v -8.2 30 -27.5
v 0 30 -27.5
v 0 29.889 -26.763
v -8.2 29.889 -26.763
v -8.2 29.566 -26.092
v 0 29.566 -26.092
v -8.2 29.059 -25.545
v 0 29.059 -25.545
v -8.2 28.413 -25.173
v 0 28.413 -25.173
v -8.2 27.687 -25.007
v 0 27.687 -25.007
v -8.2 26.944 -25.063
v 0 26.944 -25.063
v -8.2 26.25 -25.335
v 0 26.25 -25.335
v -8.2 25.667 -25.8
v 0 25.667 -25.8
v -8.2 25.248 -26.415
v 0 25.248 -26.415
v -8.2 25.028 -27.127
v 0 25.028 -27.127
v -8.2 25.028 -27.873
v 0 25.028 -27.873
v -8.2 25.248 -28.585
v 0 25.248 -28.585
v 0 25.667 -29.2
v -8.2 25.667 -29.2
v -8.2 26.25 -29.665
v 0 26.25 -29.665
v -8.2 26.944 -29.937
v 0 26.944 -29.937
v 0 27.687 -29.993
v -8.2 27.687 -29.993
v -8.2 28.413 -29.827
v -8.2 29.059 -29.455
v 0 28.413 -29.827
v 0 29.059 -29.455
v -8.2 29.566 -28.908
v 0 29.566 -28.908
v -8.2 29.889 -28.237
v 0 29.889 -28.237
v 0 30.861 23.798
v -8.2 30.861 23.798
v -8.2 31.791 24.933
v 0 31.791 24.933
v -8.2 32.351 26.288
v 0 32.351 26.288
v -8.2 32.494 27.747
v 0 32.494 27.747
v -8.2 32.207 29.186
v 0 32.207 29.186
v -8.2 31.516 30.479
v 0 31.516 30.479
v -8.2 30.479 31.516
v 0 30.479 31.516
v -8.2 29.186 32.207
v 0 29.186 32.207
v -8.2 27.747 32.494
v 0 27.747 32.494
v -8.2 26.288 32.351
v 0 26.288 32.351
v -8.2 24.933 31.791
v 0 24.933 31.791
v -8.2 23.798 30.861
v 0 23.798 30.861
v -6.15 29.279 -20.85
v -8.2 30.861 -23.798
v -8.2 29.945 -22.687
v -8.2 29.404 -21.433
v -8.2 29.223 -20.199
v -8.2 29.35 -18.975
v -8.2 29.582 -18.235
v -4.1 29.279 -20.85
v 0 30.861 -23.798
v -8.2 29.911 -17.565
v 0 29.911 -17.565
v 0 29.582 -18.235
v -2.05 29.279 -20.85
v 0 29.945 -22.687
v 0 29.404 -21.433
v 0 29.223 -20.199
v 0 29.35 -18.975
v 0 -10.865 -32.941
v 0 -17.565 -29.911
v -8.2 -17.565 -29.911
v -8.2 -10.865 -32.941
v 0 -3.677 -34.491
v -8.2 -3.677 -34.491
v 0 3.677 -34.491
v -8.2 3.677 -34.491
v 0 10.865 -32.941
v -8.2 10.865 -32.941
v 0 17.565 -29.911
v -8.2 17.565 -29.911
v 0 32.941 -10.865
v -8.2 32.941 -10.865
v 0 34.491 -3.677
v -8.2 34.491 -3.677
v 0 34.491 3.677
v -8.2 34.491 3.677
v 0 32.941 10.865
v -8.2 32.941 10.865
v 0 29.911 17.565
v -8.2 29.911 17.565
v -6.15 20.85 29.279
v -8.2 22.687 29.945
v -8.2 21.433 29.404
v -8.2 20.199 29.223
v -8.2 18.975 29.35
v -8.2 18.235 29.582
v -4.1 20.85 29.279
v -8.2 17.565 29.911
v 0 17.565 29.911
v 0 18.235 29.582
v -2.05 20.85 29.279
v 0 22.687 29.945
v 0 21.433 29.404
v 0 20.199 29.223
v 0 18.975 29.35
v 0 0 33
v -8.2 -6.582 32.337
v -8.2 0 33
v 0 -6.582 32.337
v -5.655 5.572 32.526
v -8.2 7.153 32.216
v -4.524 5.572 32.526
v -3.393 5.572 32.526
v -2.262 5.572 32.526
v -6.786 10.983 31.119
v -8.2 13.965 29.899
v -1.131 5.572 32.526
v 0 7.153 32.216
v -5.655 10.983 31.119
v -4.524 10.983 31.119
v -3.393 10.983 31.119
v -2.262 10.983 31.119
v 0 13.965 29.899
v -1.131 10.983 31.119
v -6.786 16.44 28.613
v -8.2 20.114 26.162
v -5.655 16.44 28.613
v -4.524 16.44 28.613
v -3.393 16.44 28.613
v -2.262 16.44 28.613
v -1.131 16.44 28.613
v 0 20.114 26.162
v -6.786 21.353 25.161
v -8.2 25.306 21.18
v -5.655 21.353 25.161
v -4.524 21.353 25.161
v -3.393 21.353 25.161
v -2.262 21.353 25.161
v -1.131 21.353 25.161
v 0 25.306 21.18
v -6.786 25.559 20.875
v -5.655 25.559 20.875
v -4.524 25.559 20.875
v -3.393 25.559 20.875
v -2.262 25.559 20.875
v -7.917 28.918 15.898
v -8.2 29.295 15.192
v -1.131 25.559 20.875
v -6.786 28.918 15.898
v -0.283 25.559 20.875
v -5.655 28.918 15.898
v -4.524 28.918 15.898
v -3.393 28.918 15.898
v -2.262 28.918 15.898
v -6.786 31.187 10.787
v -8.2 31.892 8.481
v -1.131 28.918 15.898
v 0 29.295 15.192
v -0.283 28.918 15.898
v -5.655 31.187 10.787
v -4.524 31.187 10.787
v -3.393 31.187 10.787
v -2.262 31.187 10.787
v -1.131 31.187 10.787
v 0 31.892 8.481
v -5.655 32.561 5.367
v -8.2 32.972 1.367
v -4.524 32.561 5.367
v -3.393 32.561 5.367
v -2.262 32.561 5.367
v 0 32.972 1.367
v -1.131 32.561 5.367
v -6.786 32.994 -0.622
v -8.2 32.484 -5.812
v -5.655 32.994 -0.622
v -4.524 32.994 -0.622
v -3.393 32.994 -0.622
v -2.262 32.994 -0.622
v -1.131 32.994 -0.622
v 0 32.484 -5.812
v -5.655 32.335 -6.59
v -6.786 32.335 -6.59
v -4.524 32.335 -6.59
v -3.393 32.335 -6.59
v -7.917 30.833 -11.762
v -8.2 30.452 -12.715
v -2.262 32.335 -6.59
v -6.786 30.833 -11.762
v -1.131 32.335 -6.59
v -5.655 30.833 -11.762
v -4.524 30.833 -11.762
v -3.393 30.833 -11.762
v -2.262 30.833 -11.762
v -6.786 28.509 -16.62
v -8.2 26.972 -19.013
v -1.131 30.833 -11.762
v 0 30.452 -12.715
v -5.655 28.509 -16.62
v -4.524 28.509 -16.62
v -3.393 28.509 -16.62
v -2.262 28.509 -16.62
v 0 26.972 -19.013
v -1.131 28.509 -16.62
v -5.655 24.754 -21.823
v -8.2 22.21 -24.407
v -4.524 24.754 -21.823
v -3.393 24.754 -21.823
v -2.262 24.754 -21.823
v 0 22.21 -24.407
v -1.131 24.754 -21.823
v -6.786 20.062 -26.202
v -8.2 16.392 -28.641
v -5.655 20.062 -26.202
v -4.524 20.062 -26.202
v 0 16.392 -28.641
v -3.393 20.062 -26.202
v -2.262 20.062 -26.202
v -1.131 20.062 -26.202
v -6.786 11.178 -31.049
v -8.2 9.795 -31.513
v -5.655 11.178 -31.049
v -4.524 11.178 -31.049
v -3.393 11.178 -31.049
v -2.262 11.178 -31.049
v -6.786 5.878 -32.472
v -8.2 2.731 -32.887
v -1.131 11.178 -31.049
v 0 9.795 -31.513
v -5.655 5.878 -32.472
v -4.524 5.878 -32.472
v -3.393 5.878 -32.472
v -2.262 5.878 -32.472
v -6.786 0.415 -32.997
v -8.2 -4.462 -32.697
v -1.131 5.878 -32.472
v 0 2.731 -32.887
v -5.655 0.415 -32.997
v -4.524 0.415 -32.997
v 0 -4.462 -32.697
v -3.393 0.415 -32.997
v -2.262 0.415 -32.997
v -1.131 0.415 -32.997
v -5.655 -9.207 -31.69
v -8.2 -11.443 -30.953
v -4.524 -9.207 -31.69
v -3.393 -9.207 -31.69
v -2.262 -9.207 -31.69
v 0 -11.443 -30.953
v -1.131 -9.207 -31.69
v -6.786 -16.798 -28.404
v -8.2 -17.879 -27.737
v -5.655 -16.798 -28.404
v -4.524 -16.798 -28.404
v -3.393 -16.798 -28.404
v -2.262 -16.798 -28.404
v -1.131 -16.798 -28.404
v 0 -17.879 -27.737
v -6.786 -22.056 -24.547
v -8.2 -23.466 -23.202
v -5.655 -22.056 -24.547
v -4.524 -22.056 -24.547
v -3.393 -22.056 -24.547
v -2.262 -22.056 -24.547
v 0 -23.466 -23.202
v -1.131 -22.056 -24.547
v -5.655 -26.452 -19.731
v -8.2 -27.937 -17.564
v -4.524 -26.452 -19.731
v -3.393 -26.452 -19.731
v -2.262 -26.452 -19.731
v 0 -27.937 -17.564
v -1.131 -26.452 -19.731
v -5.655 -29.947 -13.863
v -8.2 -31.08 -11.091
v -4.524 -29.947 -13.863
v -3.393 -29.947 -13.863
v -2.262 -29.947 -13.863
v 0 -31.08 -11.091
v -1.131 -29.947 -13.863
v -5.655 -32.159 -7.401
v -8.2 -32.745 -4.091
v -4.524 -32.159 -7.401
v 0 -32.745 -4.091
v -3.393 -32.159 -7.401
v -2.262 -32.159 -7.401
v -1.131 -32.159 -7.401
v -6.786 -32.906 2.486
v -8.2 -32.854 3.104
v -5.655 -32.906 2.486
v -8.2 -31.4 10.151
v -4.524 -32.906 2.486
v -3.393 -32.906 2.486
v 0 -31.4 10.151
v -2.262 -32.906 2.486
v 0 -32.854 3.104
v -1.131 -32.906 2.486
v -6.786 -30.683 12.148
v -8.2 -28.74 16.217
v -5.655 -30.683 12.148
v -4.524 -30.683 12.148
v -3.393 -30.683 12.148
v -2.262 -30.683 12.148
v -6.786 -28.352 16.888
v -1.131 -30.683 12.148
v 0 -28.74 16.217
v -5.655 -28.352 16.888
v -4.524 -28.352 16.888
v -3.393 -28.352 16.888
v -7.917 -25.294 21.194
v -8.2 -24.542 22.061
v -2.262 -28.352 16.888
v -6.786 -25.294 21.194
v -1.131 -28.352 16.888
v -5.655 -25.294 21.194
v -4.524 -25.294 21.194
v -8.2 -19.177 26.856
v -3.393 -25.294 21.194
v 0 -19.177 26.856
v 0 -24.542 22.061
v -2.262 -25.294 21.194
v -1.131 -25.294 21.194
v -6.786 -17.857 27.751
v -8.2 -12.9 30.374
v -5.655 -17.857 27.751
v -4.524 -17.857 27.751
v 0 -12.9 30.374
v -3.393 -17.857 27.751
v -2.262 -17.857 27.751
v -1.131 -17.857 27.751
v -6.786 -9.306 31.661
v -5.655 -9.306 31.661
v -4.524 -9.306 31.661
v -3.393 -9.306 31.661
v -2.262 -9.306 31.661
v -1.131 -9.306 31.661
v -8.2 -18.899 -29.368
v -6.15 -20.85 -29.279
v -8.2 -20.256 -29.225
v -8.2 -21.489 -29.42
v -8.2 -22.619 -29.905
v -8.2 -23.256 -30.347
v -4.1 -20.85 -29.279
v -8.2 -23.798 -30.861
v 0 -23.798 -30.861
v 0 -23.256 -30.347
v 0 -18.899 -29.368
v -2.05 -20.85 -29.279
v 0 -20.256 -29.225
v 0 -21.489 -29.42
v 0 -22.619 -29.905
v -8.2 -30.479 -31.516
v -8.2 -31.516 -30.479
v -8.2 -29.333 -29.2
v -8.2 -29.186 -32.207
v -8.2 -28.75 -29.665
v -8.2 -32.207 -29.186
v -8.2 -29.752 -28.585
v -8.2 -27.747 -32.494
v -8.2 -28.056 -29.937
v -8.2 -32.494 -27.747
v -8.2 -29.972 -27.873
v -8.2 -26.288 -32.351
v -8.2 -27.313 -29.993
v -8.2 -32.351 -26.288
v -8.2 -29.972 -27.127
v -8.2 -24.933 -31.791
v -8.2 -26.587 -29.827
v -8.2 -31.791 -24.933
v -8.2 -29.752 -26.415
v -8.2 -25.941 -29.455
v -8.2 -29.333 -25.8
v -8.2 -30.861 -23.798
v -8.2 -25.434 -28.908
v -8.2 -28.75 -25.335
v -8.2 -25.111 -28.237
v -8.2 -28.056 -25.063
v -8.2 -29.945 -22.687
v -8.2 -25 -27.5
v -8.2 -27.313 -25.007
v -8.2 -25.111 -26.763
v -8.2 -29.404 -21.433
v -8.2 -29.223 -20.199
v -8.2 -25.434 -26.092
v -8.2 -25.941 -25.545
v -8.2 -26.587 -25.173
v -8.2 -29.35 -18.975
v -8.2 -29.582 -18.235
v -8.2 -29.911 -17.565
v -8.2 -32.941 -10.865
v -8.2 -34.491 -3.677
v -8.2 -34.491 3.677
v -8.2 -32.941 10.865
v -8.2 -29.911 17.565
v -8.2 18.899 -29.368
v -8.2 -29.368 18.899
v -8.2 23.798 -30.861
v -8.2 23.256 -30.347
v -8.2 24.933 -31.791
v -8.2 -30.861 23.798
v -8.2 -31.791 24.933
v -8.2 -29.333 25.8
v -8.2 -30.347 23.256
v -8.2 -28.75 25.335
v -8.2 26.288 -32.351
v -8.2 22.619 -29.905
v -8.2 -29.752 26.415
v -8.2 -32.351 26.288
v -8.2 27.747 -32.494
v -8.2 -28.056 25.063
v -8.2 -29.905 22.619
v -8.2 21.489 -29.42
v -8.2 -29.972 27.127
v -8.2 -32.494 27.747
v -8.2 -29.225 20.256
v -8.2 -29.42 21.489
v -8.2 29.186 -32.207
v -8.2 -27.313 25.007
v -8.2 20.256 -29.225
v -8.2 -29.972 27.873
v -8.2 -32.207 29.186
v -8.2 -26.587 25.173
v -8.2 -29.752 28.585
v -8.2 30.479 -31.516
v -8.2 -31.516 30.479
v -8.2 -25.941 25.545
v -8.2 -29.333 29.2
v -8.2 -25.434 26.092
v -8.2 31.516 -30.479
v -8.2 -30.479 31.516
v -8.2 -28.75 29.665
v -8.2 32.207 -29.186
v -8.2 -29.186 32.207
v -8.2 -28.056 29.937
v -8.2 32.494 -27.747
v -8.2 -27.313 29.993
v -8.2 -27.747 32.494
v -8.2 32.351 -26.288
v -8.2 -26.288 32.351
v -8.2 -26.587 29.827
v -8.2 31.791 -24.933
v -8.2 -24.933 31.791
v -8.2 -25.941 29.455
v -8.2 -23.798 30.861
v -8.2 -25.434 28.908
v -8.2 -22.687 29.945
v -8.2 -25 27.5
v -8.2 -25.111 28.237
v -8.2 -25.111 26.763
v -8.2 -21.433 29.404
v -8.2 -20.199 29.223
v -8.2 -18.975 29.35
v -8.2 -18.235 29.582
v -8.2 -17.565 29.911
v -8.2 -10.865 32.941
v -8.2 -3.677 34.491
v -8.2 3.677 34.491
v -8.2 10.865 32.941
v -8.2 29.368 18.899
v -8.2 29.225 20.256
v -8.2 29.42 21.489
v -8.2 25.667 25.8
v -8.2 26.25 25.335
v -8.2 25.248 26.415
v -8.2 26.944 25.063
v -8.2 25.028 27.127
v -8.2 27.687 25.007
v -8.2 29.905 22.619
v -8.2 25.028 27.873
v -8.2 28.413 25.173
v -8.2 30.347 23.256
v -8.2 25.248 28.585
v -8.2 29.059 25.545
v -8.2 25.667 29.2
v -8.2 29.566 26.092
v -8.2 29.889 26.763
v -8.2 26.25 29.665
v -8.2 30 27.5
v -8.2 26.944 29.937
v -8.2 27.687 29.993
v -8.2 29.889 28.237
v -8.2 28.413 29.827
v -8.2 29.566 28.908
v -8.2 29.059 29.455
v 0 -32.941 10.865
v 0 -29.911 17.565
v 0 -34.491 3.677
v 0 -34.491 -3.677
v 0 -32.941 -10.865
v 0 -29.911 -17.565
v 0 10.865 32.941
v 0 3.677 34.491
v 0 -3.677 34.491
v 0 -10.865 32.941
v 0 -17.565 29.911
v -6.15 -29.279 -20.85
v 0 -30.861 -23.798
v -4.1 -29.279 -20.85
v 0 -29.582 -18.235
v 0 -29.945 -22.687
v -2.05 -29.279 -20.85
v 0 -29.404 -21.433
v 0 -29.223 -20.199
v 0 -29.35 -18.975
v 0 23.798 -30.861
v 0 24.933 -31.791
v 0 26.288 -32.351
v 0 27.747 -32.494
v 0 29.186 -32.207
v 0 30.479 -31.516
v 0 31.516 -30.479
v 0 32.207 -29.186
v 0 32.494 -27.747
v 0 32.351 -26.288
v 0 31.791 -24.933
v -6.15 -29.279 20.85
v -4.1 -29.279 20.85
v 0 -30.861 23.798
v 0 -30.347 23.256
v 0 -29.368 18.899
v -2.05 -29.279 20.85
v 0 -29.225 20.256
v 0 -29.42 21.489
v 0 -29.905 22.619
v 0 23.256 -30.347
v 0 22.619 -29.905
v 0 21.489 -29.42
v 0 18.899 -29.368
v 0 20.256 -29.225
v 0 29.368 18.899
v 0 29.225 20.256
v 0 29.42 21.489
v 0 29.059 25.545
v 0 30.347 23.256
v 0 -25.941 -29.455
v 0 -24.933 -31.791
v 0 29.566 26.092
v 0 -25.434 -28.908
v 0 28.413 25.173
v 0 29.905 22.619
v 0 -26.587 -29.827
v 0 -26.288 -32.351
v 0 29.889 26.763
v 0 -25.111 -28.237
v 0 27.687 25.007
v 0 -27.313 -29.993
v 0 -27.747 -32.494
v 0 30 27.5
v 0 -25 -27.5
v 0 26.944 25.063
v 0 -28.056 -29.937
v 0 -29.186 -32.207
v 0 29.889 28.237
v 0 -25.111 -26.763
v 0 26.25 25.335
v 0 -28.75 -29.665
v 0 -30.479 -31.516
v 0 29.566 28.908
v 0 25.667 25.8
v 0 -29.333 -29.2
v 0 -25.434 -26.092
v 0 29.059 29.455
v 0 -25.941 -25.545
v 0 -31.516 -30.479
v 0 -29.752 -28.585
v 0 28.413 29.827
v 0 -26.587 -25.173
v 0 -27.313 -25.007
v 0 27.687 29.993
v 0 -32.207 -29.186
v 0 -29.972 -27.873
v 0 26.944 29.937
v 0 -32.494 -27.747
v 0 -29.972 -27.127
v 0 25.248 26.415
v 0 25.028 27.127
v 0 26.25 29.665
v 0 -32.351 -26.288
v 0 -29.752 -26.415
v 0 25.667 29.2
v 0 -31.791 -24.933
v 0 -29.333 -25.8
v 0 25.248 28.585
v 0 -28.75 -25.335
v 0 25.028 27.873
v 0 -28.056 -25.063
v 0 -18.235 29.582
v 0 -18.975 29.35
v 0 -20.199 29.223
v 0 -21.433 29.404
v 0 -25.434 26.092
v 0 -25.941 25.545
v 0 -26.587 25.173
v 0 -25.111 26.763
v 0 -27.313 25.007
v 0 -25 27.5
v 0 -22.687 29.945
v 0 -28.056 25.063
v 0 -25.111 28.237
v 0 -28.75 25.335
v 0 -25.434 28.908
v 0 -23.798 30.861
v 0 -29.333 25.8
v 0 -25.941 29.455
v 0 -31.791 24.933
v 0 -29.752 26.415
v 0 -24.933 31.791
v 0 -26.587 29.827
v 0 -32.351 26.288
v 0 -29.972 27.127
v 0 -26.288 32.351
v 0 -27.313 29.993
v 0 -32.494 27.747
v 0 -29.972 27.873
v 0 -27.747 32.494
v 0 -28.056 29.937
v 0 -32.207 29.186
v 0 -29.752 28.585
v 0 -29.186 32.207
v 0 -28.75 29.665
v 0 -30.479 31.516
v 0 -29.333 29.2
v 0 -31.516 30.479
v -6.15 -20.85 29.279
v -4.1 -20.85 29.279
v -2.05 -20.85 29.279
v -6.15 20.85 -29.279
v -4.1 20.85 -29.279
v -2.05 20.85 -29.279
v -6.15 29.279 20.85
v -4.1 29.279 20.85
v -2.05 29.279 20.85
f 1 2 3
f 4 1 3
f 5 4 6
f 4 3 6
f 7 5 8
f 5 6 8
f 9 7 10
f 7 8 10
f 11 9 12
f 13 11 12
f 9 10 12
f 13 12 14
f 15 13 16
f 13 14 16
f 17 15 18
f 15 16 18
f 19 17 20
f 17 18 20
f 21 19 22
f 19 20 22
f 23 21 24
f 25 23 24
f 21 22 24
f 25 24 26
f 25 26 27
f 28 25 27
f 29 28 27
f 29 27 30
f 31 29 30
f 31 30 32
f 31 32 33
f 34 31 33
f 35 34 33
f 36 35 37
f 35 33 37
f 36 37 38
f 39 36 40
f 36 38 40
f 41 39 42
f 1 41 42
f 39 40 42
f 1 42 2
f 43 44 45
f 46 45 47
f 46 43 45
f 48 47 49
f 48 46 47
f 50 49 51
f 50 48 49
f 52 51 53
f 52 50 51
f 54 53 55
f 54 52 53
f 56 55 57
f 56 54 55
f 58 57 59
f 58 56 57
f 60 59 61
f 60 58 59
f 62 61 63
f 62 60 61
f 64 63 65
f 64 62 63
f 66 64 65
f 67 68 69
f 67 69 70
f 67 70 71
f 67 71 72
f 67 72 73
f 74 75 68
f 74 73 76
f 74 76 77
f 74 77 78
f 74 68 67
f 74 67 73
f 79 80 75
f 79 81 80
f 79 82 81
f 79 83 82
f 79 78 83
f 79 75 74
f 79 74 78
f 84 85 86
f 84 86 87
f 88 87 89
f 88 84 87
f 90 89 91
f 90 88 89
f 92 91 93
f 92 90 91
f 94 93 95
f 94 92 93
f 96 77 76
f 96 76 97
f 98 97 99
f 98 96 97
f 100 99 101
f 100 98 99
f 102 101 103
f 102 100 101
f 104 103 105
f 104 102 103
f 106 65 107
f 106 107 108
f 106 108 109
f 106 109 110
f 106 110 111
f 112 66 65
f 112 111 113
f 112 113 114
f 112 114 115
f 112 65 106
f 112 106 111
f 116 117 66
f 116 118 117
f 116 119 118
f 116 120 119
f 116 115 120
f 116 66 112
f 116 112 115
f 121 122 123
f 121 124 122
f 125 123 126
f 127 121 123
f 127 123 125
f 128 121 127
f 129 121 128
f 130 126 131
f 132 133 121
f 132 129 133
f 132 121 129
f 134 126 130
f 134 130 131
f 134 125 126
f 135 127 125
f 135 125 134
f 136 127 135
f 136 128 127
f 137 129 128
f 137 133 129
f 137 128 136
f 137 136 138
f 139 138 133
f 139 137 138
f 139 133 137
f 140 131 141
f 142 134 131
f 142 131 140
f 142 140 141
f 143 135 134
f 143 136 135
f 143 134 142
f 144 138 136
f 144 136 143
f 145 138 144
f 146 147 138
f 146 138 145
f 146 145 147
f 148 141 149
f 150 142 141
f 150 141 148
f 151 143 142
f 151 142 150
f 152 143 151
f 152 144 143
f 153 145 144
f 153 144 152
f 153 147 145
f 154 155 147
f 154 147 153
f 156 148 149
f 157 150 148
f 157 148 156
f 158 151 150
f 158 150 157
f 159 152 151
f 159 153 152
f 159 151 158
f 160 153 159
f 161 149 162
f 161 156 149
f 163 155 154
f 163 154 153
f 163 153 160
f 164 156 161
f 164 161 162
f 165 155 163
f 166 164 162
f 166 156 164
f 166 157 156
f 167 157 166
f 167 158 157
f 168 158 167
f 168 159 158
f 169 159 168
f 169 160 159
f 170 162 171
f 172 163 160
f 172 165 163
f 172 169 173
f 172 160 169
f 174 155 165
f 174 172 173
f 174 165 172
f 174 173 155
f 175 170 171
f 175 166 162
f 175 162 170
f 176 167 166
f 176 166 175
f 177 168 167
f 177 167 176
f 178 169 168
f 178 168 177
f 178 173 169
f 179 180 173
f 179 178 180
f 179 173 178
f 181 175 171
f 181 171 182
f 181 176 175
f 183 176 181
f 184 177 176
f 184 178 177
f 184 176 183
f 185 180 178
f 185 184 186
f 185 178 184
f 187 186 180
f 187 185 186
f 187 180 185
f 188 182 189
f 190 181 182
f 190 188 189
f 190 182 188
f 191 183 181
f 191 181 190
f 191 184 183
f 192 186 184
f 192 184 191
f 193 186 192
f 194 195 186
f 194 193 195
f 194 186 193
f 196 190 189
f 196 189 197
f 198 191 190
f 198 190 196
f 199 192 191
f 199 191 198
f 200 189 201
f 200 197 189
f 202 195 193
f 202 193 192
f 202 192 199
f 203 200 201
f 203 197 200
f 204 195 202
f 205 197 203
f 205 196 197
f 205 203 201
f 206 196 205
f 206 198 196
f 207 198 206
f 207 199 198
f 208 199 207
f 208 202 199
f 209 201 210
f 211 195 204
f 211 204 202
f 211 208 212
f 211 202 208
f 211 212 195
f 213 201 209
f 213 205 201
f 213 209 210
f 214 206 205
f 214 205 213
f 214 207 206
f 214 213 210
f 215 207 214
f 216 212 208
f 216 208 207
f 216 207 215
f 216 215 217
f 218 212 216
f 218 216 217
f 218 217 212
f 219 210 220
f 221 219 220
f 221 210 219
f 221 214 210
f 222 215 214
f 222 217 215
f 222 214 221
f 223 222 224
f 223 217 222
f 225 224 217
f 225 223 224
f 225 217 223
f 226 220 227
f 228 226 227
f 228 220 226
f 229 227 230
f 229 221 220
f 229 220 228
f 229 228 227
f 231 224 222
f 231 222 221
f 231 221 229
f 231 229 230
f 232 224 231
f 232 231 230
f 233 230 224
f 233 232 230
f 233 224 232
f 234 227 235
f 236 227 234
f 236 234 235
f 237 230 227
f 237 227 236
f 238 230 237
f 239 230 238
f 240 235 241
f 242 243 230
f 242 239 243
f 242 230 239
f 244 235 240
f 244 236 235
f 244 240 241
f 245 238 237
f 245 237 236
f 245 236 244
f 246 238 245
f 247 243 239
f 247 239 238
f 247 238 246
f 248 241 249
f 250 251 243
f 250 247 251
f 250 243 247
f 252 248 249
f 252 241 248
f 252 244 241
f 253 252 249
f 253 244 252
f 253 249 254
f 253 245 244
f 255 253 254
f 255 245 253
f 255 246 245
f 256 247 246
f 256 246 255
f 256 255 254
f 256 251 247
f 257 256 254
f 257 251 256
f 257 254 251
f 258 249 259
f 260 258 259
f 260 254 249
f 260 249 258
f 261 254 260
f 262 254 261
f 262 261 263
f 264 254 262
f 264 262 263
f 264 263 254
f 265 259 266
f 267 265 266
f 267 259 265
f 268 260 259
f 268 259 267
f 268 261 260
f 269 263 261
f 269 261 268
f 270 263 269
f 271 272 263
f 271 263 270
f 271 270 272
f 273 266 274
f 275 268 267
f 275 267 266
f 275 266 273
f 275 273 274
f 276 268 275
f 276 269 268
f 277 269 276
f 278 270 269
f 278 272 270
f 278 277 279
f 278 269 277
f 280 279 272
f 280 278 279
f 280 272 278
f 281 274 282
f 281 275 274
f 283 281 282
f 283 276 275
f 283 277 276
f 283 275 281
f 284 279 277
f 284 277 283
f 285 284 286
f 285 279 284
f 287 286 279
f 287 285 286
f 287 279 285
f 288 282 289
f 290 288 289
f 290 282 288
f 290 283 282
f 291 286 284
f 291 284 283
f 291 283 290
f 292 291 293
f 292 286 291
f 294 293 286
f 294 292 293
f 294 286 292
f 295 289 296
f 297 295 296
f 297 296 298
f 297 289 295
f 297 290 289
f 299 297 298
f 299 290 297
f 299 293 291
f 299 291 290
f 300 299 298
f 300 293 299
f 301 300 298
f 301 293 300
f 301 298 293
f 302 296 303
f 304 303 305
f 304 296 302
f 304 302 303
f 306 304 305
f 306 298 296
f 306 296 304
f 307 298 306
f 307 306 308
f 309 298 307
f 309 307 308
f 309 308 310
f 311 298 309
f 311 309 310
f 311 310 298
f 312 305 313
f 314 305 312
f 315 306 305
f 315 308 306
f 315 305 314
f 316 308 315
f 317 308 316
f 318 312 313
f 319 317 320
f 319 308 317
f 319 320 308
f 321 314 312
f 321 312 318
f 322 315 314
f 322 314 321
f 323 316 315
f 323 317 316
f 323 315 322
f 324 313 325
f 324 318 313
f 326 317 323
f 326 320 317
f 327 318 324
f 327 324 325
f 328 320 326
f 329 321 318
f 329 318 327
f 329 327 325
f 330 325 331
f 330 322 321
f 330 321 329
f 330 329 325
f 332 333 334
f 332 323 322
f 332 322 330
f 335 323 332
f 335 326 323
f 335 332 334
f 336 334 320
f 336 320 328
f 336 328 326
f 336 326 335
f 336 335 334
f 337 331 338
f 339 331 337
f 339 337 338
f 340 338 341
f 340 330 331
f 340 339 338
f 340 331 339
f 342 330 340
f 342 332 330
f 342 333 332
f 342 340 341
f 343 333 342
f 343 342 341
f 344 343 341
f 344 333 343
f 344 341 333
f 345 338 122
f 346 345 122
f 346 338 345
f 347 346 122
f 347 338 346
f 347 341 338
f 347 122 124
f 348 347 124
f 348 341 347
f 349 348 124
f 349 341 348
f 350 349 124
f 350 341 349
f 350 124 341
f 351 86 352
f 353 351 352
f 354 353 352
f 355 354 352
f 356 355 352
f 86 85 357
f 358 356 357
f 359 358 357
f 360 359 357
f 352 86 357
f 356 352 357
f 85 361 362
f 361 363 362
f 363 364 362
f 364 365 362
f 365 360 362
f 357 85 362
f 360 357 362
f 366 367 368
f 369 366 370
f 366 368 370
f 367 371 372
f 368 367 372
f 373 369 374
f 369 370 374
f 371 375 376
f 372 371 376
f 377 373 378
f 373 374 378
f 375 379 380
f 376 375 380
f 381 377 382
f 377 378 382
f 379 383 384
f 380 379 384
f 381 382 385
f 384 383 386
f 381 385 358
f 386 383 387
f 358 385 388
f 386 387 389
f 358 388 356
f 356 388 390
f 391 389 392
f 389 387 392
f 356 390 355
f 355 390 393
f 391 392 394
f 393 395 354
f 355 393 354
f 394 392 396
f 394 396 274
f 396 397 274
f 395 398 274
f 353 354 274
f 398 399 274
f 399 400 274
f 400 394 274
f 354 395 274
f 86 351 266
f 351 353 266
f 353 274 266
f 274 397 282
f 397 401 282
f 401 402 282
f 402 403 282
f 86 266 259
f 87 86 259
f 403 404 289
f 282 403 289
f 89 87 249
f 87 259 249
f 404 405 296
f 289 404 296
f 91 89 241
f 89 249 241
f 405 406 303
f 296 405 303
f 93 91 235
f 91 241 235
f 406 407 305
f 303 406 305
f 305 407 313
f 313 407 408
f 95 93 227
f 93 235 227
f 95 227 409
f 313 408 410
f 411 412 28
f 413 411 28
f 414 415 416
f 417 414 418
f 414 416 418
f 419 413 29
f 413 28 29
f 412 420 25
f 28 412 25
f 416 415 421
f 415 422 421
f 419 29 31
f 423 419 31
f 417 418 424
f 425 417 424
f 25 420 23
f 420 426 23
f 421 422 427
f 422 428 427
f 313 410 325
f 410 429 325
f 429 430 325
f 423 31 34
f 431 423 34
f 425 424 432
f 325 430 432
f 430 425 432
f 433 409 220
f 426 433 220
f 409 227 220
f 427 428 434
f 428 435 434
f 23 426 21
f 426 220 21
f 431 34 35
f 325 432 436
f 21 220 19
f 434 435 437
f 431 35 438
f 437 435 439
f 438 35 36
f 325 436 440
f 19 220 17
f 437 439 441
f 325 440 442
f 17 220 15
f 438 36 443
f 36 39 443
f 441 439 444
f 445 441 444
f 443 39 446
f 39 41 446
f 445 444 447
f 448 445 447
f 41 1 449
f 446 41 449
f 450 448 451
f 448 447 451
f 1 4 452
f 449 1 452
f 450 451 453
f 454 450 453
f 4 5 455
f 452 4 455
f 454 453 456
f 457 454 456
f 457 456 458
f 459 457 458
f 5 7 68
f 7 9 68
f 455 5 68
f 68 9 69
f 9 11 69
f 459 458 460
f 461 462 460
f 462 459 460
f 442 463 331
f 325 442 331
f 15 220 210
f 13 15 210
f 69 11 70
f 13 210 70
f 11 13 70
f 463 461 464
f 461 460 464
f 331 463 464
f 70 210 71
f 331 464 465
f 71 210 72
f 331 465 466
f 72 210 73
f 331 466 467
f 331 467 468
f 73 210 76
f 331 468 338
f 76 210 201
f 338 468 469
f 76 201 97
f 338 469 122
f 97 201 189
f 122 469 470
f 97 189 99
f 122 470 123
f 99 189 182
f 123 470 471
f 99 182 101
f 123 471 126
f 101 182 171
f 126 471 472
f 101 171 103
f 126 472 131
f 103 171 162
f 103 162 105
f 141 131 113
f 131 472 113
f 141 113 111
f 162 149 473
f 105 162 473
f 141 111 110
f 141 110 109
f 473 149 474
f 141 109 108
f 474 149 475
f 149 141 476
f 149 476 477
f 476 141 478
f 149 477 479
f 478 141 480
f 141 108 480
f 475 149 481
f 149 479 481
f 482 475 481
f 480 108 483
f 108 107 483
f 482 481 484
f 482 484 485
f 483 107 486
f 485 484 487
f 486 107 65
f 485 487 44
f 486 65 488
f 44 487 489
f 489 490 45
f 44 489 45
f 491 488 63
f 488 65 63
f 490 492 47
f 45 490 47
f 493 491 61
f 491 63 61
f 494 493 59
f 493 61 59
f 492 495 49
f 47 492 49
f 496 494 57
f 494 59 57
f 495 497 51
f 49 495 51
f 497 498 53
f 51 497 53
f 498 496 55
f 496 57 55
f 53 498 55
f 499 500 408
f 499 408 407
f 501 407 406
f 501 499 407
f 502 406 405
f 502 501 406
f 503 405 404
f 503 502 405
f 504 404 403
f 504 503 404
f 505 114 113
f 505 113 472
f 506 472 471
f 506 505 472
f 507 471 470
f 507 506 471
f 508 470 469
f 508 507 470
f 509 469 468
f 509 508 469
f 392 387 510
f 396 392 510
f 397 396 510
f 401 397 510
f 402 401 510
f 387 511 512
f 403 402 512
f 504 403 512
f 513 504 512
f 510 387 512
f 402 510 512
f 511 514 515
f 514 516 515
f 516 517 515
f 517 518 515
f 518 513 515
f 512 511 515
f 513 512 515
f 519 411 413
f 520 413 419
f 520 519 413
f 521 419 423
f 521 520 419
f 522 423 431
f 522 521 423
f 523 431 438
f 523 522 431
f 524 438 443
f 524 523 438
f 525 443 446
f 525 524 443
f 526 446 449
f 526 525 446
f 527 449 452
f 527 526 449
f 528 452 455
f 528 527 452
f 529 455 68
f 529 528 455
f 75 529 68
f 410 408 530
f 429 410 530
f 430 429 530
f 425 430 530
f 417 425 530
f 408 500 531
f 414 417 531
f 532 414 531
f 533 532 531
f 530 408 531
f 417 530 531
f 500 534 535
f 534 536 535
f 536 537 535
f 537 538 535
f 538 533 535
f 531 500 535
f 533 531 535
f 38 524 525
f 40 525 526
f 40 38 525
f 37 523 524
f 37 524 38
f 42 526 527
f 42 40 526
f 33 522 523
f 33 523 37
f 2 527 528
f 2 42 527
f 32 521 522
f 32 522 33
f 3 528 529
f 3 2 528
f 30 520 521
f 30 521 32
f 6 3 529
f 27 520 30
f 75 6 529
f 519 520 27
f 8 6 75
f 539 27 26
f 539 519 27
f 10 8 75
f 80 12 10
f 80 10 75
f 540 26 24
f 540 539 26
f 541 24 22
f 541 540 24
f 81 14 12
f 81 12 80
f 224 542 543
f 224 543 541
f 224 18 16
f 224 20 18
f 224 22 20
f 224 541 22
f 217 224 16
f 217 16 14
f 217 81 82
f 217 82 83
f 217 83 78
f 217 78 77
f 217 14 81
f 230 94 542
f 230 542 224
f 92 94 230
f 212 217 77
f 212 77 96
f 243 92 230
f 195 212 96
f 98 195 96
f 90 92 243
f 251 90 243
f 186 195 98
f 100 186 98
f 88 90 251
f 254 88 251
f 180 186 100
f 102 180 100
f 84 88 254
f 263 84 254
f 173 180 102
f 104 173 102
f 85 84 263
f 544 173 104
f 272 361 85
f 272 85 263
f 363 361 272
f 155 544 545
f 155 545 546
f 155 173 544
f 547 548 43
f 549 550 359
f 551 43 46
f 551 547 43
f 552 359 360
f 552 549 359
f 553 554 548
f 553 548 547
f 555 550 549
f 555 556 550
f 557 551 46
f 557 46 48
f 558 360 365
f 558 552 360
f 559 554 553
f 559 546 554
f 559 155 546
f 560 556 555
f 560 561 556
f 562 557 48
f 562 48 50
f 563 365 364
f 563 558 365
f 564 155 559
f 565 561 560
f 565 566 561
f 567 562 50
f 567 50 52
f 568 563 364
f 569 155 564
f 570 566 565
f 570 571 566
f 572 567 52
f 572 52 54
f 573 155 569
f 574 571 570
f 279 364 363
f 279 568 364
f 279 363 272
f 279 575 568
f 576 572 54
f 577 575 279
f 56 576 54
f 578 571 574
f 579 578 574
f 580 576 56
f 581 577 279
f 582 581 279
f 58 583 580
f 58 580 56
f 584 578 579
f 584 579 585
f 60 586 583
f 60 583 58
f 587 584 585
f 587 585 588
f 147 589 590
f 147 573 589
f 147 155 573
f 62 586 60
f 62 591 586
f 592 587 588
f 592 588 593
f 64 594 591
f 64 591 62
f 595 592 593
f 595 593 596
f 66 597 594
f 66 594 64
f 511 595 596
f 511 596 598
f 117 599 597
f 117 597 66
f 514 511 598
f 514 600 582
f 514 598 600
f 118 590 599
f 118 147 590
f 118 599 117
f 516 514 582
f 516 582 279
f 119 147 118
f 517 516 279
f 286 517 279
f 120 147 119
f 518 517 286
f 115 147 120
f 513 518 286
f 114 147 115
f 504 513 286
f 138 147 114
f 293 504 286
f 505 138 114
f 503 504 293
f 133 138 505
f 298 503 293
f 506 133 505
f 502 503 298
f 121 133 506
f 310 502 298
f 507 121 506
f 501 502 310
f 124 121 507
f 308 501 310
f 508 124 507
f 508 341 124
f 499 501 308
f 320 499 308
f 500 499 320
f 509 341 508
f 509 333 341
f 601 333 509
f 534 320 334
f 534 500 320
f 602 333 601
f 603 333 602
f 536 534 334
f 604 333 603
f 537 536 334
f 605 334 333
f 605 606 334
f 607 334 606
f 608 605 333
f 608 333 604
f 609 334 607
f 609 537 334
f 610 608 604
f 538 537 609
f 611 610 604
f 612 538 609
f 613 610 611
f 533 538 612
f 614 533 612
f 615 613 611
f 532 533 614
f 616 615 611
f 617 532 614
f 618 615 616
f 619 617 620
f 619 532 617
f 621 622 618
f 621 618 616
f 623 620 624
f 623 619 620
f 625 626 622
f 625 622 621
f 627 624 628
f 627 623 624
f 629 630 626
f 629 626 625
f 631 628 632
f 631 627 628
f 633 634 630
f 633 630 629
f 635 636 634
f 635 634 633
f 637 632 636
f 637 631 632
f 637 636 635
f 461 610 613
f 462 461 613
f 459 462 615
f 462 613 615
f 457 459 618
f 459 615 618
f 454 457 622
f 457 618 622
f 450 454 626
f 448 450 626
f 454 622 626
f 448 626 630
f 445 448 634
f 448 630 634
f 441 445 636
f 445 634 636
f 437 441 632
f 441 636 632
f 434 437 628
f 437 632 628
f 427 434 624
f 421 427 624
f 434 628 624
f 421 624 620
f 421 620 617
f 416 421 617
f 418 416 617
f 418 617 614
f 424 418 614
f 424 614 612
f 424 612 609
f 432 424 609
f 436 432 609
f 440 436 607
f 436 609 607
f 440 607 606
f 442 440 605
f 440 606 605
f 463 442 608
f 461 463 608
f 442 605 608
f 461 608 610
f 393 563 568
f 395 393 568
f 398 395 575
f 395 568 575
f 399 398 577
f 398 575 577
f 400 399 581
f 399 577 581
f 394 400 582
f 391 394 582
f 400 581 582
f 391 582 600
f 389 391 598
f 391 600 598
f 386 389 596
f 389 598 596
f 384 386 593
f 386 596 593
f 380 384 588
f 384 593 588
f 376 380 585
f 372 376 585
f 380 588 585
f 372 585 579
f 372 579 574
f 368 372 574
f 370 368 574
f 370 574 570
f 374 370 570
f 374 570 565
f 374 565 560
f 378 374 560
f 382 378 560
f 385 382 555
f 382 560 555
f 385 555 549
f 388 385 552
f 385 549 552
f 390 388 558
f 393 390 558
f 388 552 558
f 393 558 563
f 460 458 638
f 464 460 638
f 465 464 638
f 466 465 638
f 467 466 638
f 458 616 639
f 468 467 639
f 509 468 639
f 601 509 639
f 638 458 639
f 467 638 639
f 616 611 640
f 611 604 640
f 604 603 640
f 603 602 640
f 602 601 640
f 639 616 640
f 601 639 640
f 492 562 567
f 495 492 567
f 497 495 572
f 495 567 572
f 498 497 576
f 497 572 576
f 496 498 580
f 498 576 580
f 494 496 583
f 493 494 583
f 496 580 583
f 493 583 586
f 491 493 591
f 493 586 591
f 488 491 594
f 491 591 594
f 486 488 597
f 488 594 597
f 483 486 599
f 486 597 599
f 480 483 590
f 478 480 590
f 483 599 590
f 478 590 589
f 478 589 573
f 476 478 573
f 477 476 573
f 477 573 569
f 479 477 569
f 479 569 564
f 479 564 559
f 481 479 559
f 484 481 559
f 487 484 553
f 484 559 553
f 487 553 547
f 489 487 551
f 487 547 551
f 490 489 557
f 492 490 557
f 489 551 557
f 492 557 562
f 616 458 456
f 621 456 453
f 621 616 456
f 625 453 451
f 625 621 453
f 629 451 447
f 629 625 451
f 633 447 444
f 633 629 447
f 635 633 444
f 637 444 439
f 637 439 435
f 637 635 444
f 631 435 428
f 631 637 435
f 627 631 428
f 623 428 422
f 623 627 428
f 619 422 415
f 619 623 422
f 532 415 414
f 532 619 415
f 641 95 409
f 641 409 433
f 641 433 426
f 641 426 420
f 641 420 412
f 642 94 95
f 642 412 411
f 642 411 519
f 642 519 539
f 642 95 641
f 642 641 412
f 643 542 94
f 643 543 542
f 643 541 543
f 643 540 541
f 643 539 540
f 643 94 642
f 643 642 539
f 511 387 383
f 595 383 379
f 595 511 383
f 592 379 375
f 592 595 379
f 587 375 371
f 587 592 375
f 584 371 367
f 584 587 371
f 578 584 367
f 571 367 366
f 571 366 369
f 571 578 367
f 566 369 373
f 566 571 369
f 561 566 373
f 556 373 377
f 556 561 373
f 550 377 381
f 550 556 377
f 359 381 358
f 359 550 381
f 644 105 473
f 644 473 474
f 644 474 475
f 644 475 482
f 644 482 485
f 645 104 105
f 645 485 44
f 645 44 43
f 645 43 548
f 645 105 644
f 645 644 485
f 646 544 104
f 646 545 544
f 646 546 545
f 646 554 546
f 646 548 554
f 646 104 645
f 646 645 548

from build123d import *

# Parameters (mm, degrees)
F0_W          = 40
F0_H          = 80
F1_DEPTH      = 40
F1_DEPTH_BACK = 40
F4_R          = 64.2808012101
F5_DEPTH      = 40
F6_R          = 2.5
F7_DEPTH      = 40.001
F8_W          = 100
F8_H          = 100
F9_DEPTH      = 20.001
F10_R         = 5
F11_DEPTH     = 8.2
F12_DEPTH     = 20


with BuildPart() as f1:
    # F0 (on Front) → F1 (new body, two sides)
    with BuildSketch(Plane.XZ) as f1_sk:
        Rectangle(F0_W, F0_H)
    extrude(amount=F1_DEPTH)
    extrude(f1_sk.sketch, amount=-F1_DEPTH_BACK)

    # F2 (on Front) → F3 (revolve, cut)
    with BuildSketch(Plane.XZ):
        Polygon((17.4, 25), (-17.4, 25), (-38.4665206075, 25), (-38.4665206075, 0), (-17.4, 0), (17.4, 0), (38.4665206075, 0), (38.4665206075, 25), align=None)
        with BuildLine():
            Line((-17.4, 27.0906653559), (-17.4, 25))
            Line((-17.4, 25), (17.4, 25))
            Line((17.4, 25), (17.4, 27.0906653559))
            ThreePointArc((17.4, 27.0906653559), (16.184643895, 30.3581522477), (13.1294117647, 32.0371750827))
            ThreePointArc((13.1294117647, 32.0371750827), (0, 33), (-13.1294117647, 32.0371750827))
            ThreePointArc((-13.1294117647, 32.0371750827), (-16.184643895, 30.3581522477), (-17.4, 27.0906653559))
        make_face()
    revolve(axis=Axis((-30.739078176, 0, 0), (1, 0, 0)), mode=Mode.SUBTRACT)

    # F4 (on face) → F5 (cut)
    with BuildSketch(Plane.YZ.offset(20)):
        Circle(F4_R)
        with BuildLine():
            ThreePointArc((-22.6544660047, -26.2667926776), (-31.0355339059, -31.0355339059), (-26.2667926776, -22.6544660047))
            ThreePointArc((-26.2667926776, -22.6544660047), (-34.6867298477, 0), (-26.2667926776, 22.6544660047))
            ThreePointArc((-26.2667926776, 22.6544660047), (-31.0355339059, 31.0355339059), (-22.6544660047, 26.2667926776))
            ThreePointArc((-22.6544660047, 26.2667926776), (0, 34.6867298477), (22.6544660047, 26.2667926776))
            ThreePointArc((22.6544660047, 26.2667926776), (31.0355339059, 31.0355339059), (26.2667926776, 22.6544660047))
            ThreePointArc((26.2667926776, 22.6544660047), (34.6867298477, 0), (26.2667926776, -22.6544660047))
            ThreePointArc((26.2667926776, -22.6544660047), (31.0355339059, -31.0355339059), (22.6544660047, -26.2667926776))
            ThreePointArc((22.6544660047, -26.2667926776), (0, -34.6867298477), (-22.6544660047, -26.2667926776))
        make_face(mode=Mode.SUBTRACT)
    extrude(amount=-F5_DEPTH, mode=Mode.SUBTRACT)

    # F6 (on face) → F7 (cut, through all)
    with BuildSketch(Plane.YZ.offset(20)):
        with Locations((-27.5, 27.5)):
            Circle(F6_R)
        with Locations((27.5, 27.5)):
            Circle(F6_R)
        with Locations((-27.5, -27.5)):
            Circle(F6_R)
        with Locations((27.5, -27.5)):
            Circle(F6_R)
    extrude(amount=-F7_DEPTH, mode=Mode.SUBTRACT)

    # F8 (on Right) → F9 (cut, through all)
    with BuildSketch(Plane.YZ):
        Rectangle(F8_W, F8_H)
    extrude(amount=-F9_DEPTH, mode=Mode.SUBTRACT)

    # F10
    f10_edges = [f1.edges().sort_by_distance(p)[0] for p in [
        (10, -26.266793, -22.654466),
        (10, -26.266793, 22.654466),
        (10, 22.654466, 26.266793),
        (10, -22.654466, 26.266793),
        (10, 26.266793, 22.654466),
        (10, 26.266793, -22.654466),
        (10, 22.654466, -26.266793),
        (10, -22.654466, -26.266793),
    ]]
    fillet(f10_edges, radius=F10_R)

    # F11 (add): a face of the model
    f11_faces = [f1.faces().sort_by_distance(p)[0] for p in [
        (0, -30.341799307, -30.341799307),
    ]]
    extrude(f11_faces, amount=F11_DEPTH)

    # F12 (cut): a face of the model
    f12_faces = [f1.faces().sort_by_distance(p)[0] for p in [
        (20, 0, -33.7056409691),
    ]]
    extrude(f12_faces, amount=-F12_DEPTH, mode=Mode.SUBTRACT)


solid = f1.part
